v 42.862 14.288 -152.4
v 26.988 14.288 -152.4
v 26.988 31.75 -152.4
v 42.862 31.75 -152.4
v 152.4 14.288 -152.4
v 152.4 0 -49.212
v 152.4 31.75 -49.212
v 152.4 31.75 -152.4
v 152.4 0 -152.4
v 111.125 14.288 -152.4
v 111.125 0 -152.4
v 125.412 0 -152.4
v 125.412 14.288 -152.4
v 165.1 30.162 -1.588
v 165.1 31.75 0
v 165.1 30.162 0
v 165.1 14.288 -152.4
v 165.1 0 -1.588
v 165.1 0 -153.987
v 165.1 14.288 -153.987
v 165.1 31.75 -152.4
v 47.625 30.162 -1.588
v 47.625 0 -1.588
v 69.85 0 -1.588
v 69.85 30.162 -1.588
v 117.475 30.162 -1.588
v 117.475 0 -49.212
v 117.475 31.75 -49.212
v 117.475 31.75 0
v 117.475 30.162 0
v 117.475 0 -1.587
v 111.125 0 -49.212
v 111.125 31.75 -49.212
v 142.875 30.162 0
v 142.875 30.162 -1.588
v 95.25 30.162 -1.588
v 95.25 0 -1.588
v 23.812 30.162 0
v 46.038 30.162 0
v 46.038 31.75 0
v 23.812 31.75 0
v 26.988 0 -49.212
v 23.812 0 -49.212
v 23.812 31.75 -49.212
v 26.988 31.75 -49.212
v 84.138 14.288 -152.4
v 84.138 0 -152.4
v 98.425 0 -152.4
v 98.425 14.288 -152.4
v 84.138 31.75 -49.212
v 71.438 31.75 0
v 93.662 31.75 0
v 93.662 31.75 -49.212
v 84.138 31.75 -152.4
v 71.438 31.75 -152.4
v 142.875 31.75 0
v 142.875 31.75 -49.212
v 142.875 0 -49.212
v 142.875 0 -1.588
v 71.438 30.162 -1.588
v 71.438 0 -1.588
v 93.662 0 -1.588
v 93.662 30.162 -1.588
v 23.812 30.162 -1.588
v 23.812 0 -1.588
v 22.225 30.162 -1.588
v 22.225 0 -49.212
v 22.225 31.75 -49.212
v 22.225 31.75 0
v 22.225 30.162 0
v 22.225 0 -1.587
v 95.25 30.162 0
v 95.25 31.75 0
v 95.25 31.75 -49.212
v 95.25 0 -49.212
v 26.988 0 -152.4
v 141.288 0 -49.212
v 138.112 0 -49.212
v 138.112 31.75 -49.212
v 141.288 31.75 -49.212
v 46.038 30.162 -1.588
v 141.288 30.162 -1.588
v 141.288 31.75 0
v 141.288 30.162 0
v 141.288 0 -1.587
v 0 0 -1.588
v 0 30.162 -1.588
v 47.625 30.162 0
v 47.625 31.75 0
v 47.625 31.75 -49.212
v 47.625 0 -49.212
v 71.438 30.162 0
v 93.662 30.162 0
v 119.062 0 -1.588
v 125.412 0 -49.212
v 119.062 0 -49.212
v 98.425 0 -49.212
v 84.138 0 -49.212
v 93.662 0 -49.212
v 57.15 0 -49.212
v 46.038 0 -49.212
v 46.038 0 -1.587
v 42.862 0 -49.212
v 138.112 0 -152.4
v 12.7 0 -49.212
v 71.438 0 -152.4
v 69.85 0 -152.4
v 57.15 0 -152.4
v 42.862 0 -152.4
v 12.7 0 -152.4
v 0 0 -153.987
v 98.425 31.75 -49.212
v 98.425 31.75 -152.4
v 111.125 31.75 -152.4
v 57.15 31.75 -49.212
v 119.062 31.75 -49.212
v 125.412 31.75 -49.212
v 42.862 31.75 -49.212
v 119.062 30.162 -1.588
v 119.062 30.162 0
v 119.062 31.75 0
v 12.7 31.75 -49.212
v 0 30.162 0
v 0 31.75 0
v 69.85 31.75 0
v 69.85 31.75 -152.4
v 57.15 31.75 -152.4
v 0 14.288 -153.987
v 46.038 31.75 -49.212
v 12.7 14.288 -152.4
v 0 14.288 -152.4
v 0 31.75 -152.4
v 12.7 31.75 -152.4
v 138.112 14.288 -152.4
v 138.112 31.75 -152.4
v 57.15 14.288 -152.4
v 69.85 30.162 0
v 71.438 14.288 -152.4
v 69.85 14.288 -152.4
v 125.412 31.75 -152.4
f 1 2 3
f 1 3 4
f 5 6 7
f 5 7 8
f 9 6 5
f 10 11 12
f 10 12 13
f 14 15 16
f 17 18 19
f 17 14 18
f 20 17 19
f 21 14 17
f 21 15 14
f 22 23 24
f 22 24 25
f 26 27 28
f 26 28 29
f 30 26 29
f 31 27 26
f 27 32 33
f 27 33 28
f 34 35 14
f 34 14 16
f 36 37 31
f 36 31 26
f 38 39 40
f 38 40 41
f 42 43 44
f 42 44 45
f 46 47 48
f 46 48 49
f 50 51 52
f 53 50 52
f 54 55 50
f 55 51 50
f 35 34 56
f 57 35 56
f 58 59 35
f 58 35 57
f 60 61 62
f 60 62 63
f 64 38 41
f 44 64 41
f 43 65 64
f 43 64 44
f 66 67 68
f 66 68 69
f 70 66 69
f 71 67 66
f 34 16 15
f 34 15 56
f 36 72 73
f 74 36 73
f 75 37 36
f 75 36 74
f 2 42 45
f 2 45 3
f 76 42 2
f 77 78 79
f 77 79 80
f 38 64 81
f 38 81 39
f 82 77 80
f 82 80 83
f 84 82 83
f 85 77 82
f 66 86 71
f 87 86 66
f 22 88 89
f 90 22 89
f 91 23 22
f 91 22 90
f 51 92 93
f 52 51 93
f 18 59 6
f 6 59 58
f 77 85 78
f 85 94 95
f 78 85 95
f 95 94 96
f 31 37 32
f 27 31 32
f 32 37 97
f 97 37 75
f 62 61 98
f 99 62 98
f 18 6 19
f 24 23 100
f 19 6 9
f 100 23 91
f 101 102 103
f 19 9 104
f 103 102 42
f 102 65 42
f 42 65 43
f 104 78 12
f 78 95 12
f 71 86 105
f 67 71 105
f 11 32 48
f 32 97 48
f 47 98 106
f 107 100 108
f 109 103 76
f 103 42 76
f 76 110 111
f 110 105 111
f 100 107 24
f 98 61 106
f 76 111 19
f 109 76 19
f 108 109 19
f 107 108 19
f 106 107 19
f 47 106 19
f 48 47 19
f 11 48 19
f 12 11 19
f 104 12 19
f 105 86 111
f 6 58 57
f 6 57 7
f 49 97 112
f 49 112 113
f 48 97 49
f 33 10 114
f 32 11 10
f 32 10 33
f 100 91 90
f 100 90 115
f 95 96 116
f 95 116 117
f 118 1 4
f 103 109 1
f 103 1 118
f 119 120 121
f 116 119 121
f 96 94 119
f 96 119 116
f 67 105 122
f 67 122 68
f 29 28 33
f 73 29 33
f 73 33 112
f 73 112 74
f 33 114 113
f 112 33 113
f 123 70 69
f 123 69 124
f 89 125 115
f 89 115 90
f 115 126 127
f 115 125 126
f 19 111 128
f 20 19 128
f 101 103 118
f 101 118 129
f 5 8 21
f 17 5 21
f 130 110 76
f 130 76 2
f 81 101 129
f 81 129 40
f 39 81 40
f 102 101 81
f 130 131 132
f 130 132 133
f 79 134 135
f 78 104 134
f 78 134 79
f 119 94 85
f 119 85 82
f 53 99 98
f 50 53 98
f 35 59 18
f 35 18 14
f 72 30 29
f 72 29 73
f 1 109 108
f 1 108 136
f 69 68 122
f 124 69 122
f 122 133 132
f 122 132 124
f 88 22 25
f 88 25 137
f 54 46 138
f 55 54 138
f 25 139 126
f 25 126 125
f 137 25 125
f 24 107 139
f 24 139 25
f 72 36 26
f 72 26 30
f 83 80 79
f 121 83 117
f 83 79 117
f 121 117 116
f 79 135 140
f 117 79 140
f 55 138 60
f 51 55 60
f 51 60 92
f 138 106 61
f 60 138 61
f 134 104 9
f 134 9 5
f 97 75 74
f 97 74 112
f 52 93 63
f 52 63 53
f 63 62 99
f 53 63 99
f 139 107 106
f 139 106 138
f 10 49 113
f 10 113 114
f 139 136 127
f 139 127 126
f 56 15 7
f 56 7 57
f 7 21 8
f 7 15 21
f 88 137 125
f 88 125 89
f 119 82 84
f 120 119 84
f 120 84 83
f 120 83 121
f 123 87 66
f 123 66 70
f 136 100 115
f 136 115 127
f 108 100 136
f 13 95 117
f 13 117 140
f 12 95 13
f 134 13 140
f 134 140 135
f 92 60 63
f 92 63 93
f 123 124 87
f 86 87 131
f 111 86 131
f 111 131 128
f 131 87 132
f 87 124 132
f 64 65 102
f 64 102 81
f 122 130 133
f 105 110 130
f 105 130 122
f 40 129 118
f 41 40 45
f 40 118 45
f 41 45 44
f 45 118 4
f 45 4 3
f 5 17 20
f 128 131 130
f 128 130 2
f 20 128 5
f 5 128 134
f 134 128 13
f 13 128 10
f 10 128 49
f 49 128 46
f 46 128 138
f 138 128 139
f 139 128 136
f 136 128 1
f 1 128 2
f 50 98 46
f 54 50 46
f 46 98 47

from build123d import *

# Parameters (mm, degrees)
BOSS_EXTRUDE1_DEPTH   = 31.75
BOSS_EXTRUDE1_2_DEPTH = 31.75
BOSS_EXTRUDE1_3_DEPTH = 31.75
BOSS_EXTRUDE1_4_DEPTH = 31.75
BOSS_EXTRUDE1_5_DEPTH = 31.75
BOSS_EXTRUDE1_6_DEPTH = 31.75
BOSS_EXTRUDE1_7_DEPTH = 31.75
SKETCH2_W             = 1.5875
SKETCH2_H             = 30.1625
CUT_EXTRUDE1_DEPTH    = 166.1
SKETCH4_W             = 1.5875
SKETCH4_H             = 14.2875
BOSS_EXTRUDE2_DEPTH   = 165.1


with BuildPart() as part:
    # Sketch1 → Boss-Extrude1 (new body)
    with BuildSketch(Plane(origin=(0, 0, 0), x_dir=(1, 0, 0), z_dir=(0, 1, 0))):
        Polygon((0, 0), (0, 152.4), (12.7, 152.4), (12.7, 49.2125), (22.225, 49.2125), (22.225, 0), align=None)
    extrude(amount=BOSS_EXTRUDE1_DEPTH)


with BuildPart() as body_2:
    # Sketch1 → Boss-Extrude1 2 (new body)
    with BuildSketch(Plane(origin=(0, 0, 0), x_dir=(1, 0, 0), z_dir=(0, 1, 0))):
        Polygon((23.8125, 49.2125), (26.9875, 49.2125), (26.9875, 152.4), (42.8625, 152.4), (42.8625, 49.2125), (46.0375, 49.2125), (46.0375, 0), (23.8125, 0), align=None)
    extrude(amount=BOSS_EXTRUDE1_2_DEPTH)


with BuildPart() as body_3:
    # Sketch1 → Boss-Extrude1 3 (new body)
    with BuildSketch(Plane(origin=(0, 0, 0), x_dir=(1, 0, 0), z_dir=(0, 1, 0))):
        Polygon((47.625, 49.2125), (57.15, 49.2125), (57.15, 152.4), (69.85, 152.4), (69.85, 0), (47.625, 0), align=None)
    extrude(amount=BOSS_EXTRUDE1_3_DEPTH)


with BuildPart() as body_4:
    # Sketch1 → Boss-Extrude1 4 (new body)
    with BuildSketch(Plane(origin=(0, 0, 0), x_dir=(1, 0, 0), z_dir=(0, 1, 0))):
        Polygon((71.4375, 152.4), (71.4375, 0), (93.6625, 0), (93.6625, 49.2125), (84.1375, 49.2125), (84.1375, 152.4), align=None)
    extrude(amount=BOSS_EXTRUDE1_4_DEPTH)


with BuildPart() as body_5:
    # Sketch1 → Boss-Extrude1 5 (new body)
    with BuildSketch(Plane(origin=(0, 0, 0), x_dir=(1, 0, 0), z_dir=(0, 1, 0))):
        Polygon((95.25, 0), (95.25, 49.2125), (98.425, 49.2125), (98.425, 152.4), (111.125, 152.4), (111.125, 49.2125), (117.475, 49.2125), (117.475, 0), align=None)
    extrude(amount=BOSS_EXTRUDE1_5_DEPTH)


with BuildPart() as body_6:
    # Sketch1 → Boss-Extrude1 6 (new body)
    with BuildSketch(Plane(origin=(0, 0, 0), x_dir=(1, 0, 0), z_dir=(0, 1, 0))):
        Polygon((119.0625, 49.2125), (125.4125, 49.2125), (125.4125, 152.4), (138.1125, 152.4), (138.1125, 49.2125), (141.2875, 49.2125), (141.2875, 0), (119.0625, 0), align=None)
    extrude(amount=BOSS_EXTRUDE1_6_DEPTH)


with BuildPart() as body_7:
    # Sketch1 → Boss-Extrude1 7 (new body)
    with BuildSketch(Plane(origin=(0, 0, 0), x_dir=(1, 0, 0), z_dir=(0, 1, 0))):
        Polygon((142.875, 49.2125), (152.4, 49.2125), (152.4, 152.4), (165.1, 152.4), (165.1, 0), (142.875, 0), align=None)
    extrude(amount=BOSS_EXTRUDE1_7_DEPTH)


with BuildPart() as cut_extrude1_tool:
    # Sketch2 → Cut-Extrude1 (new body, through all)
    with BuildSketch(Plane.ZY):
        with Locations((-0.79375, 15.08125)):
            Rectangle(SKETCH2_W, SKETCH2_H)
    extrude(amount=-CUT_EXTRUDE1_DEPTH)


with BuildPart() as part_1:
    add(part.part)

    # Cut-Extrude1: cut by cut_extrude1_tool
    add(cut_extrude1_tool.part, mode=Mode.SUBTRACT)



with BuildPart() as body_2_1:
    add(body_2.part)

    # Cut-Extrude1: cut by cut_extrude1_tool
    add(cut_extrude1_tool.part, mode=Mode.SUBTRACT)


with BuildPart() as body_3_1:
    add(body_3.part)

    # Cut-Extrude1: cut by cut_extrude1_tool
    add(cut_extrude1_tool.part, mode=Mode.SUBTRACT)


with BuildPart() as body_4_1:
    add(body_4.part)

    # Cut-Extrude1: cut by cut_extrude1_tool
    add(cut_extrude1_tool.part, mode=Mode.SUBTRACT)


with BuildPart() as body_5_1:
    add(body_5.part)

    # Cut-Extrude1: cut by cut_extrude1_tool
    add(cut_extrude1_tool.part, mode=Mode.SUBTRACT)


with BuildPart() as body_6_1:
    add(body_6.part)

    # Cut-Extrude1: cut by cut_extrude1_tool
    add(cut_extrude1_tool.part, mode=Mode.SUBTRACT)


with BuildPart() as body_7_1:
    add(body_7.part)

    # Cut-Extrude1: cut by cut_extrude1_tool
    add(cut_extrude1_tool.part, mode=Mode.SUBTRACT)


with BuildPart() as part_2:
    add(part_1.part)

    add(body_2_1.part)  # Boss-Extrude2 merges body 2

    add(body_3_1.part)  # Boss-Extrude2 merges body 3

    add(body_4_1.part)  # Boss-Extrude2 merges body 4

    add(body_5_1.part)  # Boss-Extrude2 merges body 5

    add(body_6_1.part)  # Boss-Extrude2 merges body 6

    add(body_7_1.part)  # Boss-Extrude2 merges body 7
    # Sketch4 → Boss-Extrude2 (add, through all)
    with BuildSketch(Plane(origin=(0, 0, 0), x_dir=(0, 0, -1), z_dir=(1, 0, 0))):
        with Locations((153.19375, 7.14375)):
            Rectangle(SKETCH4_W, SKETCH4_H)
    extrude(amount=BOSS_EXTRUDE2_DEPTH)


solid = part_2.part
